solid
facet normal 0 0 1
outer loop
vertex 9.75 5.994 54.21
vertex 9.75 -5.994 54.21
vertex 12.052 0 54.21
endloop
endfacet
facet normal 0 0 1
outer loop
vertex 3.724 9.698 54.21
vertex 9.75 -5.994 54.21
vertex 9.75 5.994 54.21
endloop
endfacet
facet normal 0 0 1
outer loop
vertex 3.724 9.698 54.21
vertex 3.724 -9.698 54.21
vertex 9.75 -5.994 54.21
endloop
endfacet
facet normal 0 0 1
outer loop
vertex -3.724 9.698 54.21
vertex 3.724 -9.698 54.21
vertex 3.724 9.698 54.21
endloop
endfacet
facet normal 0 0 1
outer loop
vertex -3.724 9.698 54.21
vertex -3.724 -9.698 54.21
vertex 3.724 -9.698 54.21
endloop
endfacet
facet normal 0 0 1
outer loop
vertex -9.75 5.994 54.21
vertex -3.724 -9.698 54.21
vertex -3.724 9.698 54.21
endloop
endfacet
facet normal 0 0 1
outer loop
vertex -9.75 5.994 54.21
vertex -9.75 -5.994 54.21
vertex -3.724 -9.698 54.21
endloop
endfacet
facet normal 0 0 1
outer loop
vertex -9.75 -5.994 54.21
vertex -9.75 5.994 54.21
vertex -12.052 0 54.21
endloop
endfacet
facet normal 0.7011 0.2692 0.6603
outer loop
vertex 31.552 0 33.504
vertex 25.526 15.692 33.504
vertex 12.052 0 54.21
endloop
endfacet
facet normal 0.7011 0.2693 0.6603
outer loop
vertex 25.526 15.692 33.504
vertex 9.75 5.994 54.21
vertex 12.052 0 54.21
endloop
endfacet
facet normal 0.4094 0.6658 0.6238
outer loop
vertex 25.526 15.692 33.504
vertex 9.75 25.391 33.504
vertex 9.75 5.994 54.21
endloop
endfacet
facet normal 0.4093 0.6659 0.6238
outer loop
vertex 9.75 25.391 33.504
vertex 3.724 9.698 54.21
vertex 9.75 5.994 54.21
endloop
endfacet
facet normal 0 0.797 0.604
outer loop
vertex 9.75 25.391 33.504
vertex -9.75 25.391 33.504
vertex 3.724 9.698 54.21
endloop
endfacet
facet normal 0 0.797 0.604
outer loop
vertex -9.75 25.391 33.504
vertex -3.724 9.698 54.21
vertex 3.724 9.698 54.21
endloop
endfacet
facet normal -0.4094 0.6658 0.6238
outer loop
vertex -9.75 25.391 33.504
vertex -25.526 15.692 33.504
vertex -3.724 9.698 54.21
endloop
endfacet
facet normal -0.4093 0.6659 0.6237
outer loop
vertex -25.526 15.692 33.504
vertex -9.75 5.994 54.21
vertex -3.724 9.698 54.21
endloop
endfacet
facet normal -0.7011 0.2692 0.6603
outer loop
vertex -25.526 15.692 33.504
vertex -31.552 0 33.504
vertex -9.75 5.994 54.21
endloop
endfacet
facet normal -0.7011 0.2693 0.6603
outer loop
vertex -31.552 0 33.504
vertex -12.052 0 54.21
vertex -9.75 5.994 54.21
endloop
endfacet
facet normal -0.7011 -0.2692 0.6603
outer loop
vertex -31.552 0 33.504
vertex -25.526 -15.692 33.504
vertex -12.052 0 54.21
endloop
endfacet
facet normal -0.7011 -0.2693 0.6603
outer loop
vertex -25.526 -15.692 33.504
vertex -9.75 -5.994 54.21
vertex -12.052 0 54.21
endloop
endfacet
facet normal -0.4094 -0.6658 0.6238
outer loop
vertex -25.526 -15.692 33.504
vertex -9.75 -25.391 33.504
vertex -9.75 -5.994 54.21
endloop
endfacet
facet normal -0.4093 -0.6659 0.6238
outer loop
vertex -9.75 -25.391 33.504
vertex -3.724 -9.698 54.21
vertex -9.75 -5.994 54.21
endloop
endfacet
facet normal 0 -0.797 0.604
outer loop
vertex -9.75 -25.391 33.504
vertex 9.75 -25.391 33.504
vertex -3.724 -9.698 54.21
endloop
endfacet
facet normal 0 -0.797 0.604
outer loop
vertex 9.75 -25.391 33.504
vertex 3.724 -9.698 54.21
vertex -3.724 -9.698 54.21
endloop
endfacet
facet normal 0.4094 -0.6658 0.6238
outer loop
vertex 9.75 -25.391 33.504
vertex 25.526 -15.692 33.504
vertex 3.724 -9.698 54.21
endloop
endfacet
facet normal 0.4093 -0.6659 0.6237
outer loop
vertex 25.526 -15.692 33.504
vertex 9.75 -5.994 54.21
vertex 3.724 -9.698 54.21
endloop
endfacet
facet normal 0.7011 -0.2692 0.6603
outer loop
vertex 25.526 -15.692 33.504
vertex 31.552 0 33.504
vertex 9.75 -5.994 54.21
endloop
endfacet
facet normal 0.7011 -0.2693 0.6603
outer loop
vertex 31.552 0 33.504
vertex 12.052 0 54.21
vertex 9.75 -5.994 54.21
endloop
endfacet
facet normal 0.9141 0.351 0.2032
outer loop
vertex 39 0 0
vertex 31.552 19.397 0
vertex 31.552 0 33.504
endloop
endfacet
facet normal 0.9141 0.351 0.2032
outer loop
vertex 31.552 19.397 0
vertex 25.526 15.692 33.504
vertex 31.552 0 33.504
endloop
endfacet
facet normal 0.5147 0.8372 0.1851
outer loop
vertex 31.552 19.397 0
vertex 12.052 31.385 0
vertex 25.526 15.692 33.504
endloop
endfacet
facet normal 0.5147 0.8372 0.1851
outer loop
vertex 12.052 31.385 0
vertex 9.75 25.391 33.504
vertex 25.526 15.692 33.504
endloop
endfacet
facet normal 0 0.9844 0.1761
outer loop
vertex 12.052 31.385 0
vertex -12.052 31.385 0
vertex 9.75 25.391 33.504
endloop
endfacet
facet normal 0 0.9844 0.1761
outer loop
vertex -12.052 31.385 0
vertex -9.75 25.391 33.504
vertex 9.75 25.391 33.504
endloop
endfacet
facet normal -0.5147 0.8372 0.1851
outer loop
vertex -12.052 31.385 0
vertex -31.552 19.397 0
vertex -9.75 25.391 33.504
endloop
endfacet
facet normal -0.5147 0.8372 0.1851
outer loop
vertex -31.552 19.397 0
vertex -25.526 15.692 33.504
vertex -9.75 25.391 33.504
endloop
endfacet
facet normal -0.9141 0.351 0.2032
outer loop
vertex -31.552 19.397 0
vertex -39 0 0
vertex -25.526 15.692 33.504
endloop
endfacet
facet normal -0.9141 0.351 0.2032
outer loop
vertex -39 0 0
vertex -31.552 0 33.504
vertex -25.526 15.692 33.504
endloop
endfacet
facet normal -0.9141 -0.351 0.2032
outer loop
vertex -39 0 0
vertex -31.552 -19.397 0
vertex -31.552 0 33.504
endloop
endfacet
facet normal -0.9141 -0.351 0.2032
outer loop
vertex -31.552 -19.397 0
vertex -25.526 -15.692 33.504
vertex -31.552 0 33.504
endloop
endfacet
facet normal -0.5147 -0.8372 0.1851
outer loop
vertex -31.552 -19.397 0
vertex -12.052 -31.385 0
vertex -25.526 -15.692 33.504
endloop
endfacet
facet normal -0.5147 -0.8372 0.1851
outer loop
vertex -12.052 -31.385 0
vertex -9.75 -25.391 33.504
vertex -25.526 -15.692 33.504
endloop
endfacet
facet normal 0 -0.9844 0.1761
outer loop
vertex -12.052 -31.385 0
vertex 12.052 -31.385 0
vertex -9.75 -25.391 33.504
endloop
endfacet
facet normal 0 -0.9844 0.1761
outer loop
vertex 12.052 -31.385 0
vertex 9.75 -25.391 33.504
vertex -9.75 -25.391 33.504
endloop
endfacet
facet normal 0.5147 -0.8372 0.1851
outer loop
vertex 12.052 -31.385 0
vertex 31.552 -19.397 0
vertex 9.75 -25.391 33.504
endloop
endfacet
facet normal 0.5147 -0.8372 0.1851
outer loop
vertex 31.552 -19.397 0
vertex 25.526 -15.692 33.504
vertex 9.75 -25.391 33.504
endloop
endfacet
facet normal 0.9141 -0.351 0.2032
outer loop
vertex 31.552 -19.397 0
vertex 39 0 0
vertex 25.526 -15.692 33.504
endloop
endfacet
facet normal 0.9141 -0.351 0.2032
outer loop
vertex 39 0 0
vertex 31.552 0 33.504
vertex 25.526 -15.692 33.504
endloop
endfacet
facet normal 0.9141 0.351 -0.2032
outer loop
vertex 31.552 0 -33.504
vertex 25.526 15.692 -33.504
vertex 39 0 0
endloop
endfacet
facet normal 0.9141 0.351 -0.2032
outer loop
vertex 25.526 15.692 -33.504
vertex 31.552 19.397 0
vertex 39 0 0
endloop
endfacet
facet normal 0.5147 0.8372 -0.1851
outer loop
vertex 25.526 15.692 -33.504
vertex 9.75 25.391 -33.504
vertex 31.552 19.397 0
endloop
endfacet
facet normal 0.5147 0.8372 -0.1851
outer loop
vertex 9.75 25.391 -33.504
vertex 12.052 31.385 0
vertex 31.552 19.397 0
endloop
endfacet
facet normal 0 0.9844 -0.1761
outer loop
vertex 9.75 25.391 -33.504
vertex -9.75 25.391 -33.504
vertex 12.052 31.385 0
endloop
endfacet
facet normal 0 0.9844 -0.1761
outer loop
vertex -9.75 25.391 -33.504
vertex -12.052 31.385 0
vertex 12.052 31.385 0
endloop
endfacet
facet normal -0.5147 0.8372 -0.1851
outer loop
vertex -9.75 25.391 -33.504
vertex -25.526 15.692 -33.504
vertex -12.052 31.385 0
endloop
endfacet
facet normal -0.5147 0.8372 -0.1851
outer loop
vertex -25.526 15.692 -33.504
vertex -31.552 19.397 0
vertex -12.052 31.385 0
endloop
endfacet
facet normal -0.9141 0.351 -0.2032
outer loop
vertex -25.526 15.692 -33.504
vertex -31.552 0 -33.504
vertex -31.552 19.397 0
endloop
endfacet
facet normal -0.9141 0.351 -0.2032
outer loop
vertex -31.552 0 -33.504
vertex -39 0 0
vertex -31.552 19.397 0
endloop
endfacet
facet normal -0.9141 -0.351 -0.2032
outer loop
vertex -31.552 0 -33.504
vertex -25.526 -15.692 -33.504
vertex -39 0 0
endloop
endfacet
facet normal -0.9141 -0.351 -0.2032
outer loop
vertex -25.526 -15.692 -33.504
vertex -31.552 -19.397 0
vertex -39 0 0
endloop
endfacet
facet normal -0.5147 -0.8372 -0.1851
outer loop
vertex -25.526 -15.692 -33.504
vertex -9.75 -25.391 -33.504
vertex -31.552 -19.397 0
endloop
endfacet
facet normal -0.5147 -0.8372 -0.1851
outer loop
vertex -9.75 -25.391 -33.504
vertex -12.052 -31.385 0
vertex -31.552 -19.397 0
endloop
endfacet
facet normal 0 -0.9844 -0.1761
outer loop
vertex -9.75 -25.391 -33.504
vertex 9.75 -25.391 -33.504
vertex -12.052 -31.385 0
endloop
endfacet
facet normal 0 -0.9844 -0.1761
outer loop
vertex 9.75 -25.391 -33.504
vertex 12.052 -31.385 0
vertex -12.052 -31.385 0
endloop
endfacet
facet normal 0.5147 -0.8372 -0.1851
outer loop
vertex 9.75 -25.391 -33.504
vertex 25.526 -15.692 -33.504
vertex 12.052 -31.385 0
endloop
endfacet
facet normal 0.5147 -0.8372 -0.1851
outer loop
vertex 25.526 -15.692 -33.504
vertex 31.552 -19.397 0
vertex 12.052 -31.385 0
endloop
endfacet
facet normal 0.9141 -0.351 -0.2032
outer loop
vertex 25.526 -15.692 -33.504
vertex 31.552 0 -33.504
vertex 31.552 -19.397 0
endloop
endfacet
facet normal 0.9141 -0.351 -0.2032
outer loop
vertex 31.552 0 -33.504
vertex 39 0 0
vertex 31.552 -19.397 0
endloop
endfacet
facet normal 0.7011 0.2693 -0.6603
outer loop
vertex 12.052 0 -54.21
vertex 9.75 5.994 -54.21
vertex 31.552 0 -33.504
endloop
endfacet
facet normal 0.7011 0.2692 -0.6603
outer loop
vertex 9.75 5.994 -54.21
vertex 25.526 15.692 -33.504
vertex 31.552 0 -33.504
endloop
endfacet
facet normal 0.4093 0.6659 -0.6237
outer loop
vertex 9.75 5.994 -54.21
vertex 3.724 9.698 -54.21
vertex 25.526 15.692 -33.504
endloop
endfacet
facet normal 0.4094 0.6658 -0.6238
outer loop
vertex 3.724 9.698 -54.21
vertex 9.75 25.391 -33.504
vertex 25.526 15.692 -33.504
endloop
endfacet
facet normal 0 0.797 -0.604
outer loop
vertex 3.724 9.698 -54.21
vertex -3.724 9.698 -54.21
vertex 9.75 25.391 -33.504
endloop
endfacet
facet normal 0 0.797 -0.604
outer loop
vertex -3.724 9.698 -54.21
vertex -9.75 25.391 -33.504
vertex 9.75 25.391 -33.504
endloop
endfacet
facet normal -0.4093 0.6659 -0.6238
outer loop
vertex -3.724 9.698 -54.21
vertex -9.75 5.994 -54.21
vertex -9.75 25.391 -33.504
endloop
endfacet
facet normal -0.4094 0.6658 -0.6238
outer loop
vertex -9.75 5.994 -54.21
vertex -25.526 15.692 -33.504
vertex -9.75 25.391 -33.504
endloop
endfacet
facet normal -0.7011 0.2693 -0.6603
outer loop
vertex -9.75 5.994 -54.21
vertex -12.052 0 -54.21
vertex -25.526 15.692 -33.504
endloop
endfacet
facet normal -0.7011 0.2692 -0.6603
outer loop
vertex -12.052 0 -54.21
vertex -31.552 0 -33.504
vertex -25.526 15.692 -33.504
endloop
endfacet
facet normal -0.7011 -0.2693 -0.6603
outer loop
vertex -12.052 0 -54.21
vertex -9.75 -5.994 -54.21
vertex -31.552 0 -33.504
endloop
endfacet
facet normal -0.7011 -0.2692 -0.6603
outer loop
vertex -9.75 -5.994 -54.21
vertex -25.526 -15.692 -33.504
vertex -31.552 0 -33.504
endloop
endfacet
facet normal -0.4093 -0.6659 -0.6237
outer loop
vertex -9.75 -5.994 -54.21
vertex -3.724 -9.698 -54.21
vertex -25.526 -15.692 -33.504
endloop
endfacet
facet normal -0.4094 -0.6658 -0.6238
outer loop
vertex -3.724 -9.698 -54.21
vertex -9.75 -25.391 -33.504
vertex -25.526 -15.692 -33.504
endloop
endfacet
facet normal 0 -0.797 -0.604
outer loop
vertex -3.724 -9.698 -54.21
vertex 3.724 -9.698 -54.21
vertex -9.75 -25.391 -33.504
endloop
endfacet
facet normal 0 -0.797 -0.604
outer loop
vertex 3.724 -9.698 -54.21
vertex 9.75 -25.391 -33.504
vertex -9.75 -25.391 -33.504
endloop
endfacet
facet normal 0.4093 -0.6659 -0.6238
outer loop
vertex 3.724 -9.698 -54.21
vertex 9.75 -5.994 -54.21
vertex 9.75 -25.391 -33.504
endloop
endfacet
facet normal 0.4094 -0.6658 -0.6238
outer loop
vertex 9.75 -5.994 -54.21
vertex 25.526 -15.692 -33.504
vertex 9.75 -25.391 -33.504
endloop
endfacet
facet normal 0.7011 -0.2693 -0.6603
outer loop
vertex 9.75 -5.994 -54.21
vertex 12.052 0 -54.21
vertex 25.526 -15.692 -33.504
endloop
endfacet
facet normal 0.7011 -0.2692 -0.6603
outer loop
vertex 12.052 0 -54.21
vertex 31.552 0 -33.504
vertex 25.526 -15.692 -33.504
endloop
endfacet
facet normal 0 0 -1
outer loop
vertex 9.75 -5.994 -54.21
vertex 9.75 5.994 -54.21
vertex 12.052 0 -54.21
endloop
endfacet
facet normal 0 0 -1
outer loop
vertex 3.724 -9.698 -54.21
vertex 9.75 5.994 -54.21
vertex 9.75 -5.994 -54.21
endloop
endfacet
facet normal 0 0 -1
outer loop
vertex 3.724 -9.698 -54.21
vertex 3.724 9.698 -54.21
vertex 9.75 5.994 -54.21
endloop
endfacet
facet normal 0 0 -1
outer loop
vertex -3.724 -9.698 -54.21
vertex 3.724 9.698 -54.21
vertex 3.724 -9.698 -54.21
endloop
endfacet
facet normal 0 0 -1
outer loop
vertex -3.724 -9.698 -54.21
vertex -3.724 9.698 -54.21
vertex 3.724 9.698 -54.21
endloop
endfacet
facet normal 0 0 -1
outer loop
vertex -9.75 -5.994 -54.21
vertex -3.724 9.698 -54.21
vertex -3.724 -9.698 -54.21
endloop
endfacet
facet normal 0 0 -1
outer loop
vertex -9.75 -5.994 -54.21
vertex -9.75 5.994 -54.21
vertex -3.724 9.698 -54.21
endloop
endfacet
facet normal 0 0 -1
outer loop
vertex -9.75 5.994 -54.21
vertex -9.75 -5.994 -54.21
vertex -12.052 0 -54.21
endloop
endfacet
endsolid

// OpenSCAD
// Generated by SolidPython 1.0.1 on 2020-07-29 00:46:51


scale(v = [13, 11, 19]) {
	sphere(r = 3);
}
/***********************************************
*********      SolidPython code:      **********
************************************************
 
# import packages: SolidPython
from solid import *
from solid.utils import *
from itertools import chain, combinations, permutations


class Resize:

    def __init__(self, scad_file):
        self.scad_file = scad_file
        #self.scad_file = import_scad(scad_file)
        # cone/cylinder param:
        self.r1 = 0
        self.r2 = 0
        self.h = 0
        # rectangular prism param:
        self.w = 0
        self.l = 0
        # ellipse param:
        self.r = 0

    # import OpenScad code (file name corresponds to shape)


    # classify shape + parameters
    def assign(self, param1, param2, param3):
        if self.scad_file == 'cone.scad':
            self.r1 = param1
            self.r2 = param2
            self.h = param3
        elif self.scad_file == 'cylinder.scad':
            self.r1 = param1
            self.r2 = param2
            self.h = param3
        elif self.scad_file == 'rectangularPrism.scad':
            self.h = param1
            self.l = param2
            self.w = param3
        else:
            self.r = param1
            self.h = param2

    # resize parameters
    def iterate(self):
        x = range(3, 20, 2)
        i = 1
        if self.scad_file == 'cone.scad':
            tempList = list(permutations(x, 2))
            for temp in tempList:
                param1 = temp[0]
                param2 = temp[1]
                filepath = 'produced_scad_files/' + 'cone' + str(param1) + '_' + str(param2) + '_' + '.scad'
                scad_render_to_file(cylinder(h=param1, r1=param2, r2=0), filepath)

        elif self.scad_file == 'cylinder.scad':
            tempList = list(permutations(x, 3))
            for temp in tempList:
                param1 = temp[0]
                param2 = temp[1]
                filepath = 'produced_scad_files/' + 'cylinder' + str(param1) + '_' + str(param2) + '_' + '.scad'
                scad_render_to_file(cylinder(h=param1, r1=param2, r2=param2), filepath)

        elif self.scad_file == 'rectangularPrism.scad':
            tempList = list(permutations(x, 3))
            for temp in tempList:
                param1 = temp[0]
                param2 = temp[1]
                param3 = temp[2]
                filepath = 'produced_scad_files/' + 'rectangularPrism' + str(param1) + '_' + str(param2) + '_' + str(
                    param3) + '.scad'
                scad_render_to_file(cube(size=(param1, param2, param3)), filepath)

        elif self.scad_file == 'ellipse.scad':
            tempList = list(permutations(x, 4))
            for temp in tempList:
                param1 = temp[0]
                param2 = temp[1]
                param3 = temp[2]
                param4 = temp[3]
                filepath = 'produced_scad_files/' + 'ellipse' + str(param1) + '_' + str(param2) + '_' + str(param3) + '_' + str(param4) + '.scad'
                scad_render_to_file(scale([param1, param2, param3])(sphere(r=param4)), filepath)

    def render_to_scadfile(self):
        scad_render_to_file(scad, 'example.scad') 
 
************************************************/
